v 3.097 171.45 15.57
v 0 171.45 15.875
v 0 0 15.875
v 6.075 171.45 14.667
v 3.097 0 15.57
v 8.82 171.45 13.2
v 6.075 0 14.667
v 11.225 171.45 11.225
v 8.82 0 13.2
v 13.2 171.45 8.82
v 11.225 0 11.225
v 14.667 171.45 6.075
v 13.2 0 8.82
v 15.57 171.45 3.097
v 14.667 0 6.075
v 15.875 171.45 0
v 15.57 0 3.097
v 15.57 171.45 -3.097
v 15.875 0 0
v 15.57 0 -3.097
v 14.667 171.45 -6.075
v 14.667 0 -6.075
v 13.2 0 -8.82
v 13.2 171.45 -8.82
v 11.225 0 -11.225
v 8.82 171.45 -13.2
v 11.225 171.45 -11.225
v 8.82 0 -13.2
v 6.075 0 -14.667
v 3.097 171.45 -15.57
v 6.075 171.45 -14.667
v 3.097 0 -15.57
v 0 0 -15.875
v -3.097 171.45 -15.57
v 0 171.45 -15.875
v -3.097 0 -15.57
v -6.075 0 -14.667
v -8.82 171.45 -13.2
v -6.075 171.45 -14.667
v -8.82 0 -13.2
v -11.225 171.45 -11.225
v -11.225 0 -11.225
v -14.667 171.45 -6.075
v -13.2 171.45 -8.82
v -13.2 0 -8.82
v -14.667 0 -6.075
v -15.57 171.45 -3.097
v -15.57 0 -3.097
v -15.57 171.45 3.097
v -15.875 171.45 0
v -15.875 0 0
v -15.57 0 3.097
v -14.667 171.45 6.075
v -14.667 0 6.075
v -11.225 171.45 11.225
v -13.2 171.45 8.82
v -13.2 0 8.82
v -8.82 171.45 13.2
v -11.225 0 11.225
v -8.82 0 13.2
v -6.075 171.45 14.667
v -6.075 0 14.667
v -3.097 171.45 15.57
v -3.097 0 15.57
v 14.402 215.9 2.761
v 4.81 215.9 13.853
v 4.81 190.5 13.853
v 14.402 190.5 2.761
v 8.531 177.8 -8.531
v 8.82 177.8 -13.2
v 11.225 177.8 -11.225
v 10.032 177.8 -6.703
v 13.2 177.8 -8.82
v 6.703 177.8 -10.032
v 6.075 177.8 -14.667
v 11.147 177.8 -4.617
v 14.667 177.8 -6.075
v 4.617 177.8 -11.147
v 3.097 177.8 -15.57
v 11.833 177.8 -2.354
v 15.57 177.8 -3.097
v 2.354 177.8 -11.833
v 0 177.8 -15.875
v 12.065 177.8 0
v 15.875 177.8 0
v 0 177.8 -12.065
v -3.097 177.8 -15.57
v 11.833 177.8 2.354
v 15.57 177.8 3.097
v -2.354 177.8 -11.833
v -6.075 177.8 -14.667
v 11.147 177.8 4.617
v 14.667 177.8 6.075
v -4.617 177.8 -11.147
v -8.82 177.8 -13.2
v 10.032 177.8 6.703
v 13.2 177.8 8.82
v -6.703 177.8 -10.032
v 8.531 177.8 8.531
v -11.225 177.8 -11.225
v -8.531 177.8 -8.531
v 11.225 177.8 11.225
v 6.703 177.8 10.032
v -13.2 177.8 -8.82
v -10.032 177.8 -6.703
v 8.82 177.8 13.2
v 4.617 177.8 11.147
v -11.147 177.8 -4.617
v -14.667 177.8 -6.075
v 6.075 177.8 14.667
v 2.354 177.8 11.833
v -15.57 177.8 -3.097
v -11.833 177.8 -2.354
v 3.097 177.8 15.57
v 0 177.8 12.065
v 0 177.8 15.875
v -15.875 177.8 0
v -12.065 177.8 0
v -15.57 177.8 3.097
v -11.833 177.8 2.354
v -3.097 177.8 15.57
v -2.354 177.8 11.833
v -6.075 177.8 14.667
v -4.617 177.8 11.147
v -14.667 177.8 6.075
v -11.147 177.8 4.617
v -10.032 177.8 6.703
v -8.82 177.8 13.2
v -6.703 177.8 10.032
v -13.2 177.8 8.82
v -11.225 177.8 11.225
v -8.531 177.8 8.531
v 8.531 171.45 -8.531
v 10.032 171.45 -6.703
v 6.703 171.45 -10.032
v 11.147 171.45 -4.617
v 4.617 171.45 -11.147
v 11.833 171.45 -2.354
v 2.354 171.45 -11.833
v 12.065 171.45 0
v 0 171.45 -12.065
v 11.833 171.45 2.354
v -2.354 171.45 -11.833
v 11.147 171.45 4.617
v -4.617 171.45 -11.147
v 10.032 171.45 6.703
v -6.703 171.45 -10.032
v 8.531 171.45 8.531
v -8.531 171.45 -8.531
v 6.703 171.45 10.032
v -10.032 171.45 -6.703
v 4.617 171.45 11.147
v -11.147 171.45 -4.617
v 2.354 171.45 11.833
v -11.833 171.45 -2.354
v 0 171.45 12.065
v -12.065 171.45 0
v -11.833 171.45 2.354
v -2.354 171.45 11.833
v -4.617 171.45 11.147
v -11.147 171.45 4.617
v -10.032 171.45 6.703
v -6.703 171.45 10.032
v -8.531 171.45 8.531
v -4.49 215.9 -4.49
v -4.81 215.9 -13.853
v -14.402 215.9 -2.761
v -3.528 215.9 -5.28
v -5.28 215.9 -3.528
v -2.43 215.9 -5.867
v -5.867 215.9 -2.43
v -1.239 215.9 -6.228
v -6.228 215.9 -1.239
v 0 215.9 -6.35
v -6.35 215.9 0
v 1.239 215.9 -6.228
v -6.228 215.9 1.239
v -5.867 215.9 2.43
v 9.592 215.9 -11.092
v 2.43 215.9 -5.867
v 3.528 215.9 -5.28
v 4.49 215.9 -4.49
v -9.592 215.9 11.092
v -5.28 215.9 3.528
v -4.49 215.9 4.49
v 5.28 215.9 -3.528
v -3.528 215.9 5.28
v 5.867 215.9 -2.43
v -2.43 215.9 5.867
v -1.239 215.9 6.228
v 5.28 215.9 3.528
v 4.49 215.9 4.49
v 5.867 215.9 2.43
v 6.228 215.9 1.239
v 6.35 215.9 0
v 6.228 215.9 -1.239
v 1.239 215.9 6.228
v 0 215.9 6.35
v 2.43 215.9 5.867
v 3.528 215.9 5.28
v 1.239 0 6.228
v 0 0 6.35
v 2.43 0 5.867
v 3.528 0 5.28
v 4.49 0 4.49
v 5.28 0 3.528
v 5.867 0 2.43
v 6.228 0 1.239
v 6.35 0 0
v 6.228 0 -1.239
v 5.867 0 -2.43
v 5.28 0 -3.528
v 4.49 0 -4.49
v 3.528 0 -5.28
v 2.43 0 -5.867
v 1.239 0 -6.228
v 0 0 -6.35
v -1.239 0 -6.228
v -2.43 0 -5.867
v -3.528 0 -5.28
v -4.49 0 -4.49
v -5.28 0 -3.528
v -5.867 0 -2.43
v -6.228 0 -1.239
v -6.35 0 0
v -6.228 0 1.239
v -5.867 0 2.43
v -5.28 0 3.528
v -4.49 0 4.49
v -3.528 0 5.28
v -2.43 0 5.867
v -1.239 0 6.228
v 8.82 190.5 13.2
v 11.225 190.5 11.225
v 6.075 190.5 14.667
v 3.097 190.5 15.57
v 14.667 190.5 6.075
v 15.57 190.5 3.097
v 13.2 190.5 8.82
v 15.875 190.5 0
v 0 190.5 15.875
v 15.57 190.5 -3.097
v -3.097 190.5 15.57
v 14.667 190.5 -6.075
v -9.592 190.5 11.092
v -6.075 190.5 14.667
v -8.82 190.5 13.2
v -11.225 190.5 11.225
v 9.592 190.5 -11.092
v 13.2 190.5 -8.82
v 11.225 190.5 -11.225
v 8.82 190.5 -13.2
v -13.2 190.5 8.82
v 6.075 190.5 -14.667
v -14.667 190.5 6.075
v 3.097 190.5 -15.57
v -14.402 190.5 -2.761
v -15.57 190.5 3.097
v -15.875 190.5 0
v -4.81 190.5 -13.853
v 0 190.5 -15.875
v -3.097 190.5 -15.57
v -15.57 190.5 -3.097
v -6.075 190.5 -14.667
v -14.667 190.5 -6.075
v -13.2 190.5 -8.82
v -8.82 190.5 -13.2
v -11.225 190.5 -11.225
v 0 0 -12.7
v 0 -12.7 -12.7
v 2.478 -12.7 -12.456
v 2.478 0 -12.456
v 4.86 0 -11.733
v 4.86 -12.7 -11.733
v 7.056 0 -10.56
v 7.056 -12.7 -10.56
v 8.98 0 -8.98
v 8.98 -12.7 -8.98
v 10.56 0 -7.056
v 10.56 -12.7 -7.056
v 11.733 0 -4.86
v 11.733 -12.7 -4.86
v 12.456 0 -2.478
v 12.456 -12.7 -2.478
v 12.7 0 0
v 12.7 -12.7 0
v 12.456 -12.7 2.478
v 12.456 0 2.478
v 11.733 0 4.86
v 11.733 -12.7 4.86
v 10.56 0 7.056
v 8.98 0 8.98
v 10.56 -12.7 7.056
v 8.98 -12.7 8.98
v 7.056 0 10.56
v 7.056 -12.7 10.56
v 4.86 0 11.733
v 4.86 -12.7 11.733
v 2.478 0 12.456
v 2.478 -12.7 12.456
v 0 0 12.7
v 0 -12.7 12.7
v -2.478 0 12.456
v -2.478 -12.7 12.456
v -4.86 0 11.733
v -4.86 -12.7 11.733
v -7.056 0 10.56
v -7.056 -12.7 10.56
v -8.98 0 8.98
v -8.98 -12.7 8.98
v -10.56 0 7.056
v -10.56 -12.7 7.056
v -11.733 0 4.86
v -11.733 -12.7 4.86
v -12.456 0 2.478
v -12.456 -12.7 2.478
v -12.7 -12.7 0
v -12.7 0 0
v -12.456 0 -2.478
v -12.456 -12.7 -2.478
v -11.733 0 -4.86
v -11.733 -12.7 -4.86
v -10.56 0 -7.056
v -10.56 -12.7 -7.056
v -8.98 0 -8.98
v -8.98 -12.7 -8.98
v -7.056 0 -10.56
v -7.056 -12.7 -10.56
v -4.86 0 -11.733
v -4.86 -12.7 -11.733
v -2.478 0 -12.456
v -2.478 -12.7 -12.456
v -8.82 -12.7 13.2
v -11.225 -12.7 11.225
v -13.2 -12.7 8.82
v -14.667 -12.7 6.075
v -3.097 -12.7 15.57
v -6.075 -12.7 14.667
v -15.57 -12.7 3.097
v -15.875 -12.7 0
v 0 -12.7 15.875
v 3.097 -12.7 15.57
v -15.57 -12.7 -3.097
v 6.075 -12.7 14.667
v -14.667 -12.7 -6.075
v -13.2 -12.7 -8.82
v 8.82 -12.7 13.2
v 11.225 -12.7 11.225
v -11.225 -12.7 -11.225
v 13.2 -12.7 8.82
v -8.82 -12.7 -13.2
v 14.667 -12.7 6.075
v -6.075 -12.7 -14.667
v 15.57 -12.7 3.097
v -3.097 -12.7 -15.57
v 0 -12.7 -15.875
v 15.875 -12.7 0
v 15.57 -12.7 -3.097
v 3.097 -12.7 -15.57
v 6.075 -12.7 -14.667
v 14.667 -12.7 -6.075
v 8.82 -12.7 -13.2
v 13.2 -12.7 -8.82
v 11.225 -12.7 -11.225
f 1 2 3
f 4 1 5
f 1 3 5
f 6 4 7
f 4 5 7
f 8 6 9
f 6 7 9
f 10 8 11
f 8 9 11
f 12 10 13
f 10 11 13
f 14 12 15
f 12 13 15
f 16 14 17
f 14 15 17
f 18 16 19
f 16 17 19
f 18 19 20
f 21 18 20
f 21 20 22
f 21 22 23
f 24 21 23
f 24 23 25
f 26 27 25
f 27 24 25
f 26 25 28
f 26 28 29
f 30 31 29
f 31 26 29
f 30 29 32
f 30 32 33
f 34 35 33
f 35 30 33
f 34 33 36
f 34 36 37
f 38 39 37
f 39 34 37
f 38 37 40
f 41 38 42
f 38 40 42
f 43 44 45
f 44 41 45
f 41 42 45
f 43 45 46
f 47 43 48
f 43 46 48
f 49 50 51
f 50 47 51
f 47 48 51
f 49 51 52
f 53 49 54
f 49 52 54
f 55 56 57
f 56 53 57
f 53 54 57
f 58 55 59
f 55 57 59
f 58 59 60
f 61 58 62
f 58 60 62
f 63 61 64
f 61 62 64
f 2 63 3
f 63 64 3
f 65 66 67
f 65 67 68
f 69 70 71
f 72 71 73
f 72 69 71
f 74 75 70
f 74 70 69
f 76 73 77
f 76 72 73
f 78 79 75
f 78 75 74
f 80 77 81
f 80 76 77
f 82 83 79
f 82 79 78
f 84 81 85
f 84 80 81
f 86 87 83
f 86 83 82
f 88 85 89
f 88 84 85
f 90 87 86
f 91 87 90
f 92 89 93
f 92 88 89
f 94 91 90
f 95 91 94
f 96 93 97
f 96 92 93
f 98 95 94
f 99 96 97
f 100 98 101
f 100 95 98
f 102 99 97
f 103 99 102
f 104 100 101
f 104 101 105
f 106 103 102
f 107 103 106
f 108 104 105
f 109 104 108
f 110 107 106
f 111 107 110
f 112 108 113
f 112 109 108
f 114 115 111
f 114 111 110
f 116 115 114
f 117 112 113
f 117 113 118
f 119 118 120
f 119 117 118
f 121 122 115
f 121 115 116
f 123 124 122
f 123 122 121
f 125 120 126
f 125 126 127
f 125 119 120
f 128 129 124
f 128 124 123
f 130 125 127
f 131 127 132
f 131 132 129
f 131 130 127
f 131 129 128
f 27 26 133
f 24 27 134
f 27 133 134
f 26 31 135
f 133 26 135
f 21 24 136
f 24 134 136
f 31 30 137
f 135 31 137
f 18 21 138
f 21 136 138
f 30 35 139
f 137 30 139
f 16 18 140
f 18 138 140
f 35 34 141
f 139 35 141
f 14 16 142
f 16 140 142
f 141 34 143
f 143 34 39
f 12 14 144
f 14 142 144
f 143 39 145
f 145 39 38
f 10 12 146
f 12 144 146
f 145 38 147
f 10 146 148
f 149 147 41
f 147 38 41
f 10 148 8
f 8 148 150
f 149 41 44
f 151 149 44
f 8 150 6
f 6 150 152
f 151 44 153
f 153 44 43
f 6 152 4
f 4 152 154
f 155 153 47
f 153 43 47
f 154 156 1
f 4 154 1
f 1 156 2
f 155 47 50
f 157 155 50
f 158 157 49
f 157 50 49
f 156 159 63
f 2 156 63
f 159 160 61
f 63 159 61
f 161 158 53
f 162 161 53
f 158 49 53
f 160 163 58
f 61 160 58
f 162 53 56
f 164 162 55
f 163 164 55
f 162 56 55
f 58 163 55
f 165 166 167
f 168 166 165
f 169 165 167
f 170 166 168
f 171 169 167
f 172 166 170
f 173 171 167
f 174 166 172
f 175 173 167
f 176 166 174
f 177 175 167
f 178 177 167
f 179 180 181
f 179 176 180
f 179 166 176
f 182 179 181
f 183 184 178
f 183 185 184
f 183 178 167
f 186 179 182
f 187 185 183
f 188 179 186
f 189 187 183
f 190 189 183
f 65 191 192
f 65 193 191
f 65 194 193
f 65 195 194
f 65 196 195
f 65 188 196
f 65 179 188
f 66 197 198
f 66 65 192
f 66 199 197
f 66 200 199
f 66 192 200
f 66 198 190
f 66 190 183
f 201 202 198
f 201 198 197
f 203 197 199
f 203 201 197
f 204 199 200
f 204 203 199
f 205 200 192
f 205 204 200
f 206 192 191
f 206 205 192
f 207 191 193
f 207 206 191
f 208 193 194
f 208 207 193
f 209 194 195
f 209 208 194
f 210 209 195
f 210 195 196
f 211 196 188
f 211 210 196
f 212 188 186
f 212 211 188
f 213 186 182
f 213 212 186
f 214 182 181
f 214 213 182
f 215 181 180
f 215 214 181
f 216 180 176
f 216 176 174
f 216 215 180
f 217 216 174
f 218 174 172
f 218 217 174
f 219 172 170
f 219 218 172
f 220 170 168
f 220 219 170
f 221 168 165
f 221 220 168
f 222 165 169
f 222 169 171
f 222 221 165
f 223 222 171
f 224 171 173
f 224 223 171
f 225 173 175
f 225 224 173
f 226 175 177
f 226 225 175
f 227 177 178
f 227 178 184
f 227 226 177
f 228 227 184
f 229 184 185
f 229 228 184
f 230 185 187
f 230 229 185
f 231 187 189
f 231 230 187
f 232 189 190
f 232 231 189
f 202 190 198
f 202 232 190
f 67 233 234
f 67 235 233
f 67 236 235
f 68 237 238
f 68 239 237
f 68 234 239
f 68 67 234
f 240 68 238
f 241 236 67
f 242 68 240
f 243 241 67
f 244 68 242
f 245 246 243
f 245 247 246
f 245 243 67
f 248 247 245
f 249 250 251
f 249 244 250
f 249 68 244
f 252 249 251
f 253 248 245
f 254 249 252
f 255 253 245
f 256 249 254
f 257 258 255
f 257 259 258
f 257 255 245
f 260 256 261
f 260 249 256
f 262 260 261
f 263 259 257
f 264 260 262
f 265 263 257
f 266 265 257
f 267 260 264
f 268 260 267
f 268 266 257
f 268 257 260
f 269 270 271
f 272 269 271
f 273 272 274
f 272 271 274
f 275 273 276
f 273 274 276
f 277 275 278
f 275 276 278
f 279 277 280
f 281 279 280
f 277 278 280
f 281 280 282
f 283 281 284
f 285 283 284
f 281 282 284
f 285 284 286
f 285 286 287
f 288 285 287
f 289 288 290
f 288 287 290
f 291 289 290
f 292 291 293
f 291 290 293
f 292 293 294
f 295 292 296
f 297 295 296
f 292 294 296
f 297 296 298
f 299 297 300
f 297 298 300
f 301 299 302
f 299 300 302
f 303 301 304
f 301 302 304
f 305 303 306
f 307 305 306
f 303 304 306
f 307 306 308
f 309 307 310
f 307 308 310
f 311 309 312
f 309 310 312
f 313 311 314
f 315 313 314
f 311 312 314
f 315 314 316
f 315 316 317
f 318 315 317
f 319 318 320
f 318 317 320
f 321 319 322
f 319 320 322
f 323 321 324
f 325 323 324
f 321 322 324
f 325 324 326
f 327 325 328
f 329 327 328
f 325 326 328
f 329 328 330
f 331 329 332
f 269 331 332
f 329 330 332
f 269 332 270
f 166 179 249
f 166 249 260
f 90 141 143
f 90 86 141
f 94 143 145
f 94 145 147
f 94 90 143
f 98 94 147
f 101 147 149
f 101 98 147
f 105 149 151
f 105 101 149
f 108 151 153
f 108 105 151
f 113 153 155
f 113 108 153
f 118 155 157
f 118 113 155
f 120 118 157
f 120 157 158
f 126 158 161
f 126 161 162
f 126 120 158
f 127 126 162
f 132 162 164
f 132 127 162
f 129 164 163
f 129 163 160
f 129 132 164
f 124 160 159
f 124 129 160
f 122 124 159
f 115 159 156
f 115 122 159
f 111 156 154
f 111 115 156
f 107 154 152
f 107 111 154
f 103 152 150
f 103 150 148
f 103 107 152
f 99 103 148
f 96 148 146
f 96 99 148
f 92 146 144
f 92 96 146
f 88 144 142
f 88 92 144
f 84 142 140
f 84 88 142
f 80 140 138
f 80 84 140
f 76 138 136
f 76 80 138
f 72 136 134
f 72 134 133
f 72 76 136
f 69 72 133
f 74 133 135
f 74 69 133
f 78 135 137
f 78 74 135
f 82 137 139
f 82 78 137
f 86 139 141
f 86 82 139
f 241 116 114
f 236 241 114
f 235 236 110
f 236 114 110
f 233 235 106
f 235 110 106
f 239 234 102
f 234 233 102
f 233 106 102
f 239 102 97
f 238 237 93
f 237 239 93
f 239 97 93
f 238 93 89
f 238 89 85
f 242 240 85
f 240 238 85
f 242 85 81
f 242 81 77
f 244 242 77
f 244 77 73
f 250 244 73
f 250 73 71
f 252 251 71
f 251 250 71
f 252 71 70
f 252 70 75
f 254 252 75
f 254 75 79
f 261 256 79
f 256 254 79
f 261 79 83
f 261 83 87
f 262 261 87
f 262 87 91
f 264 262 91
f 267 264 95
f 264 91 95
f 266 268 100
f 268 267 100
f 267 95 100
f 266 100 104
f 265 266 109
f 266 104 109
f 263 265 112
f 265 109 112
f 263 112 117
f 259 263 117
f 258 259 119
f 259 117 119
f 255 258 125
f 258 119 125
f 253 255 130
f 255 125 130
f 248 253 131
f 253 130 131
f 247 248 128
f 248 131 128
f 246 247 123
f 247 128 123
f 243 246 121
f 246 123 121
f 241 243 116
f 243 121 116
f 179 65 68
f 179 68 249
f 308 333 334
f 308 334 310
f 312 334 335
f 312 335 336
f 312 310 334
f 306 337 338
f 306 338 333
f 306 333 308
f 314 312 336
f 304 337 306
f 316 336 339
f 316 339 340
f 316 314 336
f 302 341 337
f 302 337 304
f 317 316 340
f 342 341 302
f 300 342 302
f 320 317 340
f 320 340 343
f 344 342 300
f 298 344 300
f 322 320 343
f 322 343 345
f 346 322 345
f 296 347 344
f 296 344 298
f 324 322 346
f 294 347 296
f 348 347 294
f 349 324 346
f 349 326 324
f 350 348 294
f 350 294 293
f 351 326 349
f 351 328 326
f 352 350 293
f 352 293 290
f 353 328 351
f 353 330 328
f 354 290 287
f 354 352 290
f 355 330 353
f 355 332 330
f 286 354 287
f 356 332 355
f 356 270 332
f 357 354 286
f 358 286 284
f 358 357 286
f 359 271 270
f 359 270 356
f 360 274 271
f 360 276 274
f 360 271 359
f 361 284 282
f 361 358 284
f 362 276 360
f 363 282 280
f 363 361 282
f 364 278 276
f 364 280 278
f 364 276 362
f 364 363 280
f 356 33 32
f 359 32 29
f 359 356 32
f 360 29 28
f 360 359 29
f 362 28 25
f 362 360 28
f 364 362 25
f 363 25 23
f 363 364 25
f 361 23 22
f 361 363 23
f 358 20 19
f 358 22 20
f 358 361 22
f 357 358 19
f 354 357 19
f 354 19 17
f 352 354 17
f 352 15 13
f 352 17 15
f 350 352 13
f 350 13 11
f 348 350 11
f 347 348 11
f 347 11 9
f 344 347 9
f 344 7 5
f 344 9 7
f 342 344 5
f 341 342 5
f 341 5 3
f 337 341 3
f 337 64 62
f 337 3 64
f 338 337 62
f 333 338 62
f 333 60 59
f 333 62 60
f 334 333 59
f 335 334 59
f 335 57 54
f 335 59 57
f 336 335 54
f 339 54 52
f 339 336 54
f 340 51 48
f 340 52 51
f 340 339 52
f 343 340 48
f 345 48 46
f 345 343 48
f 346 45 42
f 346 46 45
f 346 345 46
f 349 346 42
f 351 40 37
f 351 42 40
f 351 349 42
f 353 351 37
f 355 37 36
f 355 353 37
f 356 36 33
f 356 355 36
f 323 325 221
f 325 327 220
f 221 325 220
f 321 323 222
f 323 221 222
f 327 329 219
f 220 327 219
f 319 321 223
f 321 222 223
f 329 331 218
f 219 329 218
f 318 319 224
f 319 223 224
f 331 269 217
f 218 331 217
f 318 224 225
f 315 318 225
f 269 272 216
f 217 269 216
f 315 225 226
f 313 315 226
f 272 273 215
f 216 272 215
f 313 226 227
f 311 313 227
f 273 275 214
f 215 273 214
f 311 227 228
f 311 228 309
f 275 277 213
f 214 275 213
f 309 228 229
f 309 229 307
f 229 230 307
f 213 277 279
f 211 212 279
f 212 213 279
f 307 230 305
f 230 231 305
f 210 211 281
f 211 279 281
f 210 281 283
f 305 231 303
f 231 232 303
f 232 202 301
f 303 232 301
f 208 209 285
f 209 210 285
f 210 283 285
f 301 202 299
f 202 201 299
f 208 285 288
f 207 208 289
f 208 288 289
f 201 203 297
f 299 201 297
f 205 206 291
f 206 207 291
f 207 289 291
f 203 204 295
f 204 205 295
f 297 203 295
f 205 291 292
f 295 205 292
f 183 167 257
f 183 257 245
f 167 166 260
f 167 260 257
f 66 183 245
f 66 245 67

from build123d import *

# Parameters (mm, degrees)
SKETCH1_R           = 15.875
SKETCH1_R_2         = 6.35
BOSS_EXTRUDE1_DEPTH = 215.9
BOSS_EXTRUDE2_START = 12.7
SKETCH2_R           = 15.875
SKETCH2_R_2         = 12.7
BOSS_EXTRUDE2_DEPTH = 12.7
SKETCH3_W           = 3.81
SKETCH3_H           = 6.35
CUT_EXTRUDE1_START  = -25.4
SKETCH4_R           = 15.875
CUT_EXTRUDE1_DEPTH  = 25.4


with BuildPart() as part:
    # Sketch1 → Boss-Extrude1 (new body)
    with BuildSketch(Plane(origin=(0, 0, 0), x_dir=(1, 0, 0), z_dir=(0, 1, 0))):
        with Locations(Location((0, 0, 0), (0, 0, 270))):
            Circle(SKETCH1_R)
        with Locations(Location((0, 0, 0), (0, 0, 270))):
            Circle(SKETCH1_R_2, mode=Mode.SUBTRACT)
    extrude(amount=BOSS_EXTRUDE1_DEPTH)

    # Sketch2 → Boss-Extrude2 (add)
    with BuildSketch(Plane.XZ.offset(BOSS_EXTRUDE2_START)):
        with Locations(Location((0, 0, 0), (0, 0, 270))):
            Circle(SKETCH2_R)
        with Locations(Location((0, 0, 0), (0, 0, 270))):
            Circle(SKETCH2_R_2, mode=Mode.SUBTRACT)
    extrude(amount=-BOSS_EXTRUDE2_DEPTH)

    # Sketch3 → Cut-Revolve1 (revolve, cut)
    with BuildSketch(Plane(origin=(0, 0, 0), x_dir=(0, 0, -1), z_dir=(1, 0, 0))):
        with Locations((13.97, 174.625)):
            Rectangle(SKETCH3_W, SKETCH3_H)
    revolve(axis=Axis((0, -12.7, 0), (0, 1, 0)), mode=Mode.SUBTRACT)

    # Sketch4 → Cut-Extrude1 (cut)
    with BuildSketch(Plane(origin=(0, 215.9, 0), x_dir=(1, 0, 0), z_dir=(0, 1, 0)).offset(CUT_EXTRUDE1_START)):
        with Locations(Location((0, 0, 0), (0, 0, 90))):
            Circle(SKETCH4_R)
        Polygon((9.592403624, 11.092300304), (-4.810012038, 13.853415374), (-14.402415662, 2.76111507), (-9.592403624, -11.092300304), (4.810012038, -13.853415374), (14.402415662, -2.76111507), align=None, mode=Mode.SUBTRACT)
    extrude(amount=CUT_EXTRUDE1_DEPTH, mode=Mode.SUBTRACT)


solid = part.part
